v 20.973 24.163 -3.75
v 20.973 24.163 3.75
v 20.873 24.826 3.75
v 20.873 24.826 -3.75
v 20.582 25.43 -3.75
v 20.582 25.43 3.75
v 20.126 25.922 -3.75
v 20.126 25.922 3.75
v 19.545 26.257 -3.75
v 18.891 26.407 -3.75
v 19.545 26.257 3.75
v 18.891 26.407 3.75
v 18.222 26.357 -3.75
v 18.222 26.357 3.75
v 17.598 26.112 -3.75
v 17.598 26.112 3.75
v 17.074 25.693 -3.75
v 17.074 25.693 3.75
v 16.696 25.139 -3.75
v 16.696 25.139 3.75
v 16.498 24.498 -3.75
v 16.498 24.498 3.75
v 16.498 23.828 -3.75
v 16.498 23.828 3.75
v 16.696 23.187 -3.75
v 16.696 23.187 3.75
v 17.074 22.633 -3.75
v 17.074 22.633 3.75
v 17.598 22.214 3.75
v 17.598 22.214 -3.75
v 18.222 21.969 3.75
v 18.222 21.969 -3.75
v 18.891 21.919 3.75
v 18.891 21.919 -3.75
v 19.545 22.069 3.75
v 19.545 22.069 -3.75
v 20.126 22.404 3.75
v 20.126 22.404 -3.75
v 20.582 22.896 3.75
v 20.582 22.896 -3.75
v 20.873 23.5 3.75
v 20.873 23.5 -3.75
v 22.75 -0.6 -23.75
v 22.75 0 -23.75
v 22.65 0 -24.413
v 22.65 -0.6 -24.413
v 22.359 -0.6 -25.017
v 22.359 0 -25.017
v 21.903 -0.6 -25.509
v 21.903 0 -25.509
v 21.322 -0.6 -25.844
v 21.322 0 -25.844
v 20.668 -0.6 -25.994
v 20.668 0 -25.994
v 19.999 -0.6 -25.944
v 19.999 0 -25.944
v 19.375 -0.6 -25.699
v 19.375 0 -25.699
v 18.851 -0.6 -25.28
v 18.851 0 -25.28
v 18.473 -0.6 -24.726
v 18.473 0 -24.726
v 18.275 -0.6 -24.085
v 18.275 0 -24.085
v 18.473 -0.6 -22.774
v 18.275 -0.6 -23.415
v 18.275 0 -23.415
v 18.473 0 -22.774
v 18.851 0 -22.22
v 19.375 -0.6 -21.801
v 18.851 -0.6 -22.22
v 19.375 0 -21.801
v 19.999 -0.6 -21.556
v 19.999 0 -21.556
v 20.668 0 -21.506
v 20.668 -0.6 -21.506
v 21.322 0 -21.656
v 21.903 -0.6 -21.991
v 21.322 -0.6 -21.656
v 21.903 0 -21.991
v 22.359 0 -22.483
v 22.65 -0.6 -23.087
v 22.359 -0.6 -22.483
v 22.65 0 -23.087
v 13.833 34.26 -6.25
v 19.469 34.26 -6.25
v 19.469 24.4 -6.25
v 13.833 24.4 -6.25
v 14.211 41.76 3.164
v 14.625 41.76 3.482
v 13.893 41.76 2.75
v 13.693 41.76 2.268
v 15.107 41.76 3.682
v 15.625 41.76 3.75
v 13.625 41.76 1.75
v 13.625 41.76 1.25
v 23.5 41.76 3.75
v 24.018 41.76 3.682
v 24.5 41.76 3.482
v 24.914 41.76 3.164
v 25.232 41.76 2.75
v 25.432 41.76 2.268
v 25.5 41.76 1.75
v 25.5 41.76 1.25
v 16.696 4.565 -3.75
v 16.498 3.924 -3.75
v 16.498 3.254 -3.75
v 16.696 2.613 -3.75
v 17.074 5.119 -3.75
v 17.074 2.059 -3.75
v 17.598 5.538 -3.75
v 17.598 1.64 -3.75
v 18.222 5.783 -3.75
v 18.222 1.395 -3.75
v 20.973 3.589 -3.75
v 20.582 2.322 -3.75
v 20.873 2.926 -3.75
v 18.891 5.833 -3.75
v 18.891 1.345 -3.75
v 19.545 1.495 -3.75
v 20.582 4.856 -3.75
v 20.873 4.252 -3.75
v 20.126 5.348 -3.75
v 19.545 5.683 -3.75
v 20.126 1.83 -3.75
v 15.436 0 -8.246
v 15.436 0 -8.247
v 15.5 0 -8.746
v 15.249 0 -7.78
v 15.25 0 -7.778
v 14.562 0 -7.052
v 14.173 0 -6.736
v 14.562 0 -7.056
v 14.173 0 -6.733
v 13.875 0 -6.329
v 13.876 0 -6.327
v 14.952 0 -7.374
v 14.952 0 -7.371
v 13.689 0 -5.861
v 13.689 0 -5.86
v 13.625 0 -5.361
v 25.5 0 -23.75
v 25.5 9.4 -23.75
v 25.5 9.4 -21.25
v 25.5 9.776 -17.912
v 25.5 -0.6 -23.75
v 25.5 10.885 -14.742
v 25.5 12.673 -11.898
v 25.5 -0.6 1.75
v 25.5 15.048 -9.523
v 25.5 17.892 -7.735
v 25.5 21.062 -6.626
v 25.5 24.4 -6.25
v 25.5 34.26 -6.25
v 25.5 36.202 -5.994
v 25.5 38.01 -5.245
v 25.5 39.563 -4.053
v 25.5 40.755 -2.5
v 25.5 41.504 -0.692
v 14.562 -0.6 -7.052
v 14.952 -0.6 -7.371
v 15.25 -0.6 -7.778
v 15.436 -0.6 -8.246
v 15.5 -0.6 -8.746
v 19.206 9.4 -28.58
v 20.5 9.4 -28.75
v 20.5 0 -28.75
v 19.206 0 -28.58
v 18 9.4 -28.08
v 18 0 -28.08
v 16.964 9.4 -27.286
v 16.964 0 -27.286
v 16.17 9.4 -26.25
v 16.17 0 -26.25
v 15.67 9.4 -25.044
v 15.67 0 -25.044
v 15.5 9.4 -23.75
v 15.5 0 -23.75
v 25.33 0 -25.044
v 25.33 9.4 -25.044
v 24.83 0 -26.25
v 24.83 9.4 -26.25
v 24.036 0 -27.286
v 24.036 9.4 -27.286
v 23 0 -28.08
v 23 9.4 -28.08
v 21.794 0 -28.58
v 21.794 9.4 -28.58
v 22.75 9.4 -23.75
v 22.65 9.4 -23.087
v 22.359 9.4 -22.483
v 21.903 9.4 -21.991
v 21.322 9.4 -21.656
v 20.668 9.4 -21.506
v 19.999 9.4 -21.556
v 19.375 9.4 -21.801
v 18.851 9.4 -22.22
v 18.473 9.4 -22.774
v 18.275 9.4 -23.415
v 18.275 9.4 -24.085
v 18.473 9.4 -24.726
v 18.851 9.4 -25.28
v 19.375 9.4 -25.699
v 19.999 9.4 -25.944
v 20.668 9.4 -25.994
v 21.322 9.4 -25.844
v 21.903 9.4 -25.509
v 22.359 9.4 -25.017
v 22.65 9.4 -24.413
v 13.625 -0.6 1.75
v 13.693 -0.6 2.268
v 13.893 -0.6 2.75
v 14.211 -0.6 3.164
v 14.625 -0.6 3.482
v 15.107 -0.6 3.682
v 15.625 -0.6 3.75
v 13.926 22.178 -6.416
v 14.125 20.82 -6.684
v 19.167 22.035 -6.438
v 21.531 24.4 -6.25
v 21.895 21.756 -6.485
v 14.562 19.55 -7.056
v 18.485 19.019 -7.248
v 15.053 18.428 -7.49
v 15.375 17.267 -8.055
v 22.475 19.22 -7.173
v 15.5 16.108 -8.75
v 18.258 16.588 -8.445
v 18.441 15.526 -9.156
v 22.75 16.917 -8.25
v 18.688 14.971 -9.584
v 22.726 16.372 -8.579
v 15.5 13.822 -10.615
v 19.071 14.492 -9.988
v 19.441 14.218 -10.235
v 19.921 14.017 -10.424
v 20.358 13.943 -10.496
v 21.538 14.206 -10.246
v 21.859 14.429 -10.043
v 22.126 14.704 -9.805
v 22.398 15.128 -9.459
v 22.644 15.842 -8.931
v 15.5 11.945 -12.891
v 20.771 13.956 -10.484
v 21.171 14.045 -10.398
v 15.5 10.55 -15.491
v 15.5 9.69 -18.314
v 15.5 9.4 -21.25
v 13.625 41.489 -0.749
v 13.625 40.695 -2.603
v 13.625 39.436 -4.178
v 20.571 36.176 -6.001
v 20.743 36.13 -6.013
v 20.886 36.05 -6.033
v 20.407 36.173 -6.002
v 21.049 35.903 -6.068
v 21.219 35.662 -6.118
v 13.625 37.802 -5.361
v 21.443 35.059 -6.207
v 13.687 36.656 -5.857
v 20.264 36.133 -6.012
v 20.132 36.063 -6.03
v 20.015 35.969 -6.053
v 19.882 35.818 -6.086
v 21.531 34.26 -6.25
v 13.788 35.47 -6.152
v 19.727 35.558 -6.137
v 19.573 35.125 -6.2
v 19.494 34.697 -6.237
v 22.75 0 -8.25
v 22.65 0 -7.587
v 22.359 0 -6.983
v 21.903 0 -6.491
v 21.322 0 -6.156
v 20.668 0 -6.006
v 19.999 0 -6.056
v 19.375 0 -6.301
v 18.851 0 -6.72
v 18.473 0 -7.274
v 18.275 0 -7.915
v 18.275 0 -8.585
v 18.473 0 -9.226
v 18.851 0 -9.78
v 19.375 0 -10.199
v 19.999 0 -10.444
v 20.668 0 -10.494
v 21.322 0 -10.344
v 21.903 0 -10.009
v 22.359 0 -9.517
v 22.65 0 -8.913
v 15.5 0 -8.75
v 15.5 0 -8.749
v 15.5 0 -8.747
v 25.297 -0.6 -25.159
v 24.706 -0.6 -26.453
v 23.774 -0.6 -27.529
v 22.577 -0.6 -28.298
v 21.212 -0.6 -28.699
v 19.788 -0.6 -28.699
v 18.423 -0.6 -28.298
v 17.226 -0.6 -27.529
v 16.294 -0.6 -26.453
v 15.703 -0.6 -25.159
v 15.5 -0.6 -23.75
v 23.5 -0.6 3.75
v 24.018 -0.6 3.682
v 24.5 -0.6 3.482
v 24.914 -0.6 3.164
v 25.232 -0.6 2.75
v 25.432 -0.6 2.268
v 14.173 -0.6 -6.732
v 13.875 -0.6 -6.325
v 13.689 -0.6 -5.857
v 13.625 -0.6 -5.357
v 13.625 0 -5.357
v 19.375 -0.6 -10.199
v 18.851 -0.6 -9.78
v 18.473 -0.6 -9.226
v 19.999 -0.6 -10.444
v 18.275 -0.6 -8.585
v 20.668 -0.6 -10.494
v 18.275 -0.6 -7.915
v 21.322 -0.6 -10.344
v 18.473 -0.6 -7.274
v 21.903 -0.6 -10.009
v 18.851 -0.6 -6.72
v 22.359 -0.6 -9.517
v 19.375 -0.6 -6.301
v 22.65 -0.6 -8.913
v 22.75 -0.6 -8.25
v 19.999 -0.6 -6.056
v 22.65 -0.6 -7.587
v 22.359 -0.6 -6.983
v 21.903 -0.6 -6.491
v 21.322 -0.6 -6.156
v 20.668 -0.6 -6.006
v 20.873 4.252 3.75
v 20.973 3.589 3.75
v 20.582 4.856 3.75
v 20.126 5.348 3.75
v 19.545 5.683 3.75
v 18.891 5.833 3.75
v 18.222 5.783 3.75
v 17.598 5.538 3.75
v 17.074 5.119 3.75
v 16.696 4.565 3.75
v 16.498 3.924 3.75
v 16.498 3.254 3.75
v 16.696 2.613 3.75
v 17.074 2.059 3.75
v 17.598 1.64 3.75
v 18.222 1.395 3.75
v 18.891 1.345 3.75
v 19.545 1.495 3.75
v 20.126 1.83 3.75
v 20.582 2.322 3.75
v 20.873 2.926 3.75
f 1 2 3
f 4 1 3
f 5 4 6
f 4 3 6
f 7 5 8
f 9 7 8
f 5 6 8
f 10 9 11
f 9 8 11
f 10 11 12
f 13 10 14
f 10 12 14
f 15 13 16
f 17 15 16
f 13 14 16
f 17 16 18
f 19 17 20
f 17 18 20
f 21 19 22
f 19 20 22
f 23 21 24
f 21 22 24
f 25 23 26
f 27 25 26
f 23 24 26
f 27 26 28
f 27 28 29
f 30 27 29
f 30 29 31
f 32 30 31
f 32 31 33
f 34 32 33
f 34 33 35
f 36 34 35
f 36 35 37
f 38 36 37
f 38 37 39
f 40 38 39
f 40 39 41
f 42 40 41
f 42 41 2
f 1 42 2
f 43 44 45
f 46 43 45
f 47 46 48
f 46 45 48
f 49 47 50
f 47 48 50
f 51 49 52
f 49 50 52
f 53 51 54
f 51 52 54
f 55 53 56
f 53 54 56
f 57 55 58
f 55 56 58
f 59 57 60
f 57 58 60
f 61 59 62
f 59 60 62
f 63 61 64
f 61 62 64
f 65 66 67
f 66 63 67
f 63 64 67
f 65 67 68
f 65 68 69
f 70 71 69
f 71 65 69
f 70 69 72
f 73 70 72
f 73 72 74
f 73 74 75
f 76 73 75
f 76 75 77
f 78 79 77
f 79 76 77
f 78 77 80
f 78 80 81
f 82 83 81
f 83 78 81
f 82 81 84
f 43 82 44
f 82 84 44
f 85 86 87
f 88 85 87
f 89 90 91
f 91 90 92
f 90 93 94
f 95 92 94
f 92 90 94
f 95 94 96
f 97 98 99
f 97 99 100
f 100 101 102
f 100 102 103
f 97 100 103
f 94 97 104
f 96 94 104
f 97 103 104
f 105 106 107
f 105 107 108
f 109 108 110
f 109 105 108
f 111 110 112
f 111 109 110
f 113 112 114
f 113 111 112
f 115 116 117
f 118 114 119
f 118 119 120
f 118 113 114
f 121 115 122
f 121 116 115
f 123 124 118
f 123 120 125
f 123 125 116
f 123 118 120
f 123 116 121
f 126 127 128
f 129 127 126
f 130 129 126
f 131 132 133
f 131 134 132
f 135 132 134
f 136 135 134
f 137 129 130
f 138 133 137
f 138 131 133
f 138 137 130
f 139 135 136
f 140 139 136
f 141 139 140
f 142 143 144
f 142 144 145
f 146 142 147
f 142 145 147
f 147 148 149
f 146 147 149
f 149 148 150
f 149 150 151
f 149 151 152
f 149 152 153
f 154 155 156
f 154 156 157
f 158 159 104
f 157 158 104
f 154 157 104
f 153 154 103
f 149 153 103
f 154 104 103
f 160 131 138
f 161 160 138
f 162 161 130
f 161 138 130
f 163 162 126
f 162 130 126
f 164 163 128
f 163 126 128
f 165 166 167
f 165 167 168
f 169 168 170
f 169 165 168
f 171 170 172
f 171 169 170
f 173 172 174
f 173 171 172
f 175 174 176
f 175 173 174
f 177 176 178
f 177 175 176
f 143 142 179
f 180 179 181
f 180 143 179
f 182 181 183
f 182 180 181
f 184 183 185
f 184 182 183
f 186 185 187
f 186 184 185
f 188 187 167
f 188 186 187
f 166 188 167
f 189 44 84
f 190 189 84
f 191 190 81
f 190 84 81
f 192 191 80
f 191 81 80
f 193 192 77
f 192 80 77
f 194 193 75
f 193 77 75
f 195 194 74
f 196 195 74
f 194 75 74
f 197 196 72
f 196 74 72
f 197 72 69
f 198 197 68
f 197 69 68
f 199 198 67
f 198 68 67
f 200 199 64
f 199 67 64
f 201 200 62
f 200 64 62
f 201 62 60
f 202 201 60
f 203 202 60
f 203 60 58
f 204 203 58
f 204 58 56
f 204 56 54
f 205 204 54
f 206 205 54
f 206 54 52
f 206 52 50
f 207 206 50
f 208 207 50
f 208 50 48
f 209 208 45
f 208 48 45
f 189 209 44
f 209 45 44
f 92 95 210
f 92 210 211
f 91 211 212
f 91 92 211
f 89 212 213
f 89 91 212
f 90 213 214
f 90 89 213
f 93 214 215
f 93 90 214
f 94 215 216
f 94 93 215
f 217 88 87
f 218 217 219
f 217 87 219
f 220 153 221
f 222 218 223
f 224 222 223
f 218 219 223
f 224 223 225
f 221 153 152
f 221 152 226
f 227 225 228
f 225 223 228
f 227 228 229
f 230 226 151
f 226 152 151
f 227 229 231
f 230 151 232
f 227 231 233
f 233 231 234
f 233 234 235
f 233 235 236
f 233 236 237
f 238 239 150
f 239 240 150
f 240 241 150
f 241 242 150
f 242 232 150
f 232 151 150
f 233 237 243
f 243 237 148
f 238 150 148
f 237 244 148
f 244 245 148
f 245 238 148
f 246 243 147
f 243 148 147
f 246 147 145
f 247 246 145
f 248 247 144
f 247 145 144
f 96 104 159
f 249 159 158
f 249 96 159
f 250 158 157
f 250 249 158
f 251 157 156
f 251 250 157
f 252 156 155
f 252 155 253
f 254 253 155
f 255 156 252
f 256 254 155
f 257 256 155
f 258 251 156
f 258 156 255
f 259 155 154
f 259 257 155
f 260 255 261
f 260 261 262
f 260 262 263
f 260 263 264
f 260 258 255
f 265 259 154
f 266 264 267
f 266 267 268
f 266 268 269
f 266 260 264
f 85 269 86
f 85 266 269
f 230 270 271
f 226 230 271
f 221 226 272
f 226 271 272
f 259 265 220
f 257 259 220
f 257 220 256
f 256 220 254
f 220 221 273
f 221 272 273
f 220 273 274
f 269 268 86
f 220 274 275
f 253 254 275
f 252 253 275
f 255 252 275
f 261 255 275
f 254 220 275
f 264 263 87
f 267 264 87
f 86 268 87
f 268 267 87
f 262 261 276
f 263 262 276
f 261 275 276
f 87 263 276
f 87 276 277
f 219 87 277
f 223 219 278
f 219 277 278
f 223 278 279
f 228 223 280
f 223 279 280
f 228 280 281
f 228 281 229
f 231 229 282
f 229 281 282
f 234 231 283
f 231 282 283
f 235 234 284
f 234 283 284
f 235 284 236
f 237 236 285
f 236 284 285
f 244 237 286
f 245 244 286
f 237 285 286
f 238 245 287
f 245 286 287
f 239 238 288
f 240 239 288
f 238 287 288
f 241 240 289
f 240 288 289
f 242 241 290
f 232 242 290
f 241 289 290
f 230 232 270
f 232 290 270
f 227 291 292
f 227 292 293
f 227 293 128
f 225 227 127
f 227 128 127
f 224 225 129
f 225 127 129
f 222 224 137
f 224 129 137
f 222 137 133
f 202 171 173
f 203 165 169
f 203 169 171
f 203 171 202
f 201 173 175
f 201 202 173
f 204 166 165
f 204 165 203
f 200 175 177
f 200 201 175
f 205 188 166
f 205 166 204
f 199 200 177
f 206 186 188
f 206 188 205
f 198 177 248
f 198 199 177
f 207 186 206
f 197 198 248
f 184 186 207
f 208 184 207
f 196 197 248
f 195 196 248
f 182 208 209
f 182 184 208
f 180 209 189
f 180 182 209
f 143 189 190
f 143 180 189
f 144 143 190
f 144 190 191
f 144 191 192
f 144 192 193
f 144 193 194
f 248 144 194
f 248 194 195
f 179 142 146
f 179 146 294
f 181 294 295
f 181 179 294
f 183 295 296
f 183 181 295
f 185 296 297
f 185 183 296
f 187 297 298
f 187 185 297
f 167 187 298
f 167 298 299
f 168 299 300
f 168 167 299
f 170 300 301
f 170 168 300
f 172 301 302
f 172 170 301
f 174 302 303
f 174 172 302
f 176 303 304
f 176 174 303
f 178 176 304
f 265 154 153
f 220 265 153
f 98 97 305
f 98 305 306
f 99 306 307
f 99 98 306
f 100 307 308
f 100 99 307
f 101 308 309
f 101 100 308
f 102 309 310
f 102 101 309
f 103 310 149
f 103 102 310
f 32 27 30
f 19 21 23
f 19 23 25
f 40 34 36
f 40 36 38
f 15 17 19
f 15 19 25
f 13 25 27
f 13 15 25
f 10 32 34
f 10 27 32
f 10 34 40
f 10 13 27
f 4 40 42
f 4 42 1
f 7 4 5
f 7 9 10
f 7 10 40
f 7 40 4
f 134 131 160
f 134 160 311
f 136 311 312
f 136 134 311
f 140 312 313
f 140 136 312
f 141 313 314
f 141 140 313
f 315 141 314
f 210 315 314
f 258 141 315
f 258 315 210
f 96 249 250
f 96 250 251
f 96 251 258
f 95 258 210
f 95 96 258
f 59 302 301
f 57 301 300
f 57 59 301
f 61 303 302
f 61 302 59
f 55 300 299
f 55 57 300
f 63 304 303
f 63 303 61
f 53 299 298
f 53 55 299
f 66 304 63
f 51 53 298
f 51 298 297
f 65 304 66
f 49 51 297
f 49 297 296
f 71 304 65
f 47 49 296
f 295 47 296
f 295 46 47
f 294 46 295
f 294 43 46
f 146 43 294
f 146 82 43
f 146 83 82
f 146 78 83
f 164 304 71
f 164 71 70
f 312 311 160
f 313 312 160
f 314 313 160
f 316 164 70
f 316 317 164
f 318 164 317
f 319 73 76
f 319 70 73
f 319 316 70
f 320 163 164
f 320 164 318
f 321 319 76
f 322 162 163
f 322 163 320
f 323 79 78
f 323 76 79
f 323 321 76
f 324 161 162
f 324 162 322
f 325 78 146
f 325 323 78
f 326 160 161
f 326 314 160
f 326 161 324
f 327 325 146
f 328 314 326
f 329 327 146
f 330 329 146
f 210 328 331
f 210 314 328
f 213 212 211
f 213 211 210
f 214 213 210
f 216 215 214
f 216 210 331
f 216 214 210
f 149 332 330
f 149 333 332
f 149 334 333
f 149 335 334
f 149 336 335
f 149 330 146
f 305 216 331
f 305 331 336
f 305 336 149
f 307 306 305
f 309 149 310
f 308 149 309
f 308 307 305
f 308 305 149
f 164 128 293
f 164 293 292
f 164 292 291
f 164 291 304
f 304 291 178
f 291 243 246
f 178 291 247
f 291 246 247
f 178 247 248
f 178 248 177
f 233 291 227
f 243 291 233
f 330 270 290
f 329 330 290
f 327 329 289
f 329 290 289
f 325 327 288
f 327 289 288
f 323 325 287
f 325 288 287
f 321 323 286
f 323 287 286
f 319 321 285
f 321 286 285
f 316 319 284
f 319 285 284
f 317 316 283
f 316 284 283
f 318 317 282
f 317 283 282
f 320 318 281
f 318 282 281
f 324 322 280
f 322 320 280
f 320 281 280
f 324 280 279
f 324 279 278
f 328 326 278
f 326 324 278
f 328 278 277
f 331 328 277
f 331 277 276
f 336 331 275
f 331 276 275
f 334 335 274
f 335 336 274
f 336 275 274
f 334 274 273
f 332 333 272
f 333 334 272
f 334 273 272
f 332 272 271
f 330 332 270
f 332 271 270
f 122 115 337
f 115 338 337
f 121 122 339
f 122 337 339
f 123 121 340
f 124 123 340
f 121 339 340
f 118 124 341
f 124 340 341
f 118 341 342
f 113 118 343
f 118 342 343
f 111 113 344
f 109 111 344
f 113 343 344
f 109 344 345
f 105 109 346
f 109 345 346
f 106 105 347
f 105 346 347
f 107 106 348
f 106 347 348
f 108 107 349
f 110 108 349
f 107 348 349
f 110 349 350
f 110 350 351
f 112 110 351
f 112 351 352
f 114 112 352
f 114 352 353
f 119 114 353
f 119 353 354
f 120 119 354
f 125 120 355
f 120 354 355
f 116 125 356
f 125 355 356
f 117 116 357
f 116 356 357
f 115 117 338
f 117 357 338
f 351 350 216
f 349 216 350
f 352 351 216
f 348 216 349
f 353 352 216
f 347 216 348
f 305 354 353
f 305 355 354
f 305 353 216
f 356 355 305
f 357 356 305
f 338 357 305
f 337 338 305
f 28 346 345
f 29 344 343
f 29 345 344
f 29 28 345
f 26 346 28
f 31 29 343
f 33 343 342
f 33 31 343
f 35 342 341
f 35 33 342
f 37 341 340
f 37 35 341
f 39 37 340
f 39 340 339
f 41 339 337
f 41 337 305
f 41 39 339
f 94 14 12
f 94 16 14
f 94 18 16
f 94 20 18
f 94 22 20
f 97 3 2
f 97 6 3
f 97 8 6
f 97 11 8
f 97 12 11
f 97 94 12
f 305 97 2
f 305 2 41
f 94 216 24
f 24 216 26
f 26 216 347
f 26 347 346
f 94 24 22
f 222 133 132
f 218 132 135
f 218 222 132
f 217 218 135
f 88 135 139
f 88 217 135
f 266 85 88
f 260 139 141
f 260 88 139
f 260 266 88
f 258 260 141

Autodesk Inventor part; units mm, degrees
ref_plane "YZ Plane" through (0, 0, 0) normal (1, 0, 0) x (0, 1, 0)
ref_plane "XZ Plane" through (0, 0, 0) normal (0, 1, 0) x (-1, 0, 0)
ref_plane "XY Plane" through (0, 0, 0) normal (0, 0, 1) x (1, 0, 0)
sketch "スケッチ1" plane through (0, 0, 0) normal (0, 0, 1) x (1, 0, 0)
  line L0 (0, 0) -> (25.5, 0)
  line L1 (25.5, 0) -> (25.5, 41.76)
  line L2 (25.5, 41.76) -> (0, 41.76)
  line L3 (0, 41.76) -> (0, 0)
  line L4 (0, 3) -> (25.5, 3) construction
  line L5 (13.5, 41.76) -> (13.5, 0) construction
  line L6 (12, 41.76) -> (12, 0) construction
  line L7 (12, 7.267) -> (13.5, 7.267)
  line L8 (13.5, 7.267) -> (13.5, 17.554)
  line L9 (13.5, 17.554) -> (12, 17.554)
  line L10 (12, 17.554) -> (12, 7.267)
  line L11 (12, 27.612) -> (13.5, 27.612)
  line L12 (13.5, 27.612) -> (13.5, 37.899)
  line L13 (13.5, 37.899) -> (12, 37.899)
  line L14 (12, 37.899) -> (12, 27.612)
  dimension "d0" = 3
  dimension "d1" = 38.76
  dimension "d2" = 1.5
  dimension "d3" = 12
  dimension "d4" = 25.5
  dimension "d5" = 4.267
  dimension "d6" = 10.287
  dimension "d7" = 10.058
  dimension "d8" = 10.287
  dimension "d11" = 12
extrude "押し出し1" add sketch "スケッチ1" along normal mid plane 7.5
sketch "スケッチ2" plane through (0, 0, -3.75) normal (0, -1, 0) x (1, 0, 0)
  line L0 (25.5, 7.5) -> (0, 7.5) projected
  line L1 (0, 7.5) -> (25.5, 7.5)
  line L2 (25.5, 7.5) -> (25.5, 2.5)
  line L3 (25.5, -2.5) -> (20.5, -2.5)
  line L4 (0, -2.5) -> (0, 2.5)
  line L5 (25.5, 2.5) -> (0, 2.5) construction
  line L6 (0, 3.75) -> (0, 7.5) construction
  arc A0 (0, 2.5) -> (5, -2.5) centre (5, 2.5) ccw
  line L7 (5, 2.5) -> (5, -2.5) construction
  line L8 (5, 2.5) -> (0, 2.5) construction
  arc A1 (20.5, -2.5) -> (25.5, 2.5) centre (20.5, 2.5) ccw
  line L9 (20.5, 2.5) -> (20.5, -2.5) construction
  line L10 (20.5, 2.5) -> (25.5, 2.5) construction
  line L11 (25.5, 0) -> (25.5, 7.5) projected
  line L12 (0, 2.5) -> (0, 7.5)
  line L13 (5, -2.5) -> (0, -2.5)
  line L14 (20.5, -2.5) -> (5, -2.5)
  line L15 (25.5, 2.5) -> (25.5, -2.5)
  dimension "d12" = 90
  dimension "d13" = 90
  dimension "d14" = 10
  dimension "d15" = 5
extrude "押し出し2" add sketch "スケッチ2" against normal up to surface (7.267 mm away)
extrude "押し出し3" [suppressed]
ref_plane "作業平面1" through (0, 0, -1.25) normal (0, 0, 1) x (1, 0, 0)
sketch "スケッチ3" plane through (0, 0, 3.75) normal (0, -1, 0) x (1, 0, 0)
  arc A0 (0, -5) -> (5, -10) centre (5, -5) ccw construction
  arc A1 (20.5, -10) -> (25.5, -5) centre (20.5, -5) ccw construction
  circle A2 centre (5, -5) radius 2.25
  circle A3 centre (20.5, -5) radius 2.25
  point P0 (0, -3.75)
  dimension "d20" = 4.5
  dimension "d21" = 4.5
extrude "押し出し4" cut sketch "スケッチ3" against normal up to surface (41.76 mm away)
sketch "スケッチ4" plane through (0.6699, 41.76, -3.75) normal (0, 1, 0) x (1, 0, 0)
  circle A0 centre (19.8301, -2.5) radius 2.25 construction
  circle A1 centre (4.3301, -2.5) radius 2.25 construction
  line L0 (0, 0) -> (24.1603, 0) projected
  line L1 (19.8301, 0) -> (19.8301, -2.5) construction
  line L2 (17.5801, 0) -> (17.5801, -2.5)
  line L3 (22.0801, -2.5) -> (22.0801, 0)
  arc A2 (22.0801, 0) -> (17.5801, 0) centre (19.8301, 0) ccw
  arc A3 (17.5801, -2.5) -> (22.0801, -2.5) centre (19.8301, -2.5) ccw
  line L4 (4.3301, -0.25) -> (4.3301, -2.5) construction
  line L5 (2.0801, -0.25) -> (2.0801, -2.5)
  line L6 (6.5801, -2.5) -> (6.5801, -0.25)
  arc A4 (6.5801, -0.25) -> (2.0801, -0.25) centre (4.3301, -0.25) ccw
  arc A5 (2.0801, -2.5) -> (6.5801, -2.5) centre (4.3301, -2.5) ccw
  point P0 (-0.6699, -3.75)
  point P1 (19.8301, -1.25)
  point P2 (4.3301, -1.375)
extrude "押し出し5" [suppressed]
sketch "スケッチ5" plane through (12, 7.267, 3.75) normal (1, 0, 0) x (0, 0, -1)
  line L0 (0, 0) -> (7.5, 0) construction
  line L1 (7.5, 10.287) -> (0, 10.287) construction
  line L2 (7.5, 10.287) -> (10, 12.787)
  line L3 (10, 12.787) -> (10, -2.5)
  line L4 (10, -2.5) -> (7.5, 0)
  line L5 (7.5, 0) -> (7.5, 10.287)
  line L6 (10, -7.267) -> (10, 0) projected
  point P0 (3.75, -7.267)
  dimension "d28" = 135
  dimension "d29" = 135
sketch "スケッチ6" plane through (0, 0, 3.75) normal (0, 0, 1) x (1, 0, 0)
  line L0 (12, 27.612) -> (12, 37.899) construction
  line L1 (12, 37.899) -> (13.5, 37.899) construction
  line L2 (13.5, 37.899) -> (13.5, 27.612) construction
  line L3 (13.5, 27.612) -> (12, 27.612) construction
  line L4 (12, 7.267) -> (12, 17.554) construction
  line L5 (12, 17.554) -> (13.5, 17.554) construction
  line L6 (13.5, 17.554) -> (13.5, 7.267) construction
  line L7 (13.5, 7.267) -> (12, 7.267) construction
  line L8 (0, 0) -> (25.5, 0) construction
  line L9 (25.5, 41.76) -> (0, 41.76) construction
  line L10 (13.625, 27.487) -> (13.625, 38.024)
  line L11 (13.625, 38.024) -> (11.875, 38.024)
  line L12 (11.875, 38.024) -> (11.875, 27.487)
  line L13 (11.875, 27.487) -> (13.625, 27.487)
  line L14 (13.625, 7.142) -> (13.625, 17.679)
  line L15 (13.625, 17.679) -> (11.875, 17.679)
  line L16 (11.875, 17.679) -> (11.875, 7.142)
  line L17 (11.875, 7.142) -> (13.625, 7.142)
  line L18 (0, 41.76) -> (0, 0) projected
  line L19 (25.5, 0) -> (25.5, 41.76) projected
  dimension "d32" = 0.125
  dimension "d33" = 0.125
extrude "押し出し7" cut sketch "スケッチ6" against normal through all
sketch "スケッチ8" plane through (0, 0, 3.75) normal (0, -1, 0) x (1, 0, 0)
  line L0 (13.625, 0) -> (13.625, -10) construction
  line L1 (0, 0) -> (0, -10) projected
  line L2 (0, 0) -> (13.625, 0)
  line L3 (13.625, 0) -> (13.625, -10)
  line L4 (13.625, -10) -> (0, -10)
  line L5 (0, -10) -> (0, 0)
  point P0 (0, -3.75)
extrude "押し出し10" cut sketch "スケッチ8" against normal up to surface (41.76 mm away)
sketch "スケッチ9" plane through (25.5, 7.267, -3.75) normal (0, 1, 0) x (1, 0, 0)
  line L0 (-11.875, 2.5) -> (-11.875, 0) projected
  line L1 (0, 0) -> (-11.875, 0) projected
  line L2 (0, 0) -> (0, 2.5) projected
  line L3 (0, 2.5) -> (-11.875, 2.5) projected
  point P0 (-25.5, -3.75)
extrude "押し出し11" add sketch "スケッチ9" along normal up to surface (34.493 mm away)
sketch "スケッチ10" plane through (25.5, 0, -6.25) normal (0, -1, 0) x (1, 0, 0)
  line L0 (-11.875, 0) -> (0, 0) projected
  line L1 (-11.875, 0) -> (0, 0)
  line L2 (0, 0) -> (0, -22.5)
  line L3 (0, -22.5) -> (-11.875, -22.5)
  line L4 (-11.875, -22.5) -> (-11.875, 0)
  circle A0 centre (-5, 5) radius 2.25 construction
  line L5 (-5, 5) -> (-5, -17.5) construction
  circle A1 centre (-5, -17.5) radius 2.25
  point P0 (-25.5, 6.25)
  dimension "d46" = 22.5
  dimension "d47" = 5
  dimension "d48" = 5
extrude "押し出し12" add sketch "スケッチ10" against normal up to surface (41.76 mm away)
sketch "スケッチ12" plane through (13.625, 0, 3.75) normal (0, -1, 0) x (1, 0, 0)
  circle A0 centre (6.875, -5) radius 2.25 projected
  point P0 (-13.625, -3.75)
extrude "押し出し14" add sketch "スケッチ12" against normal up to surface (41.76 mm away)
sketch "スケッチ11" plane through (0, 0, 3.75) normal (0, 0, 1) x (1, 0, 0)
  line L0 (22.75, 0) -> (18.25, 0) construction
  line L1 (18.723, 0) -> (18.723, 3.589) construction
  circle A0 centre (18.723, 3.589) radius 2.25
  line L2 (13.625, 41.76) -> (13.625, 0) projected
  line L3 (18.723, 3.589) -> (18.723, 24.163) construction
  line L4 (18.25, 0) -> (18.25, 41.76) construction
  circle A1 centre (18.723, 24.163) radius 2.25
  point P0 (0, 0)
  dimension "d51" = 4.5
  dimension "d52" = 3.589
  dimension "d53" = 5.098
  dimension "d54" = 20.574
extrude "押し出し13" cut sketch "スケッチ11" against normal blind 7.5
sketch "スケッチ13" plane through (13.625, 0, 3.75) normal (0, -1, 0) x (1, 0, 0)
  circle A0 centre (6.875, -27.5) radius 2.25 construction
  line L0 (6.875, -27.5) -> (6.875, -12) construction
  circle A1 centre (6.875, -12) radius 2.25
  point P0 (-13.625, -3.75)
  dimension "d59" = 15.5
extrude "押し出し15" cut sketch "スケッチ13" against normal up to surface (41.76 mm away)
sketch "スケッチ14" plane through (13.625, 0, 3.75) normal (0, -1, 0) x (1, 0, 0)
  line L0 (2.848, -7.5) -> (7.348, -7.5) construction
  line L1 (2.848, 0) -> (7.348, 0) construction
  line L2 (0, -32.5) -> (0, 0) projected
  line L3 (0, -32.5) -> (1.875, -32.5)
  line L4 (1.875, -32.5) -> (1.875, -10.5)
  line L5 (1.875, -10.5) -> (0, -10.5)
  line L6 (0, -10.5) -> (0, -32.5)
  circle A0 centre (6.875, -27.5) radius 2.25 projected
  point P0 (-13.625, -3.75)
  dimension "d62" = 3
  dimension "d63" = 5
extrude "押し出し16" cut sketch "スケッチ14" against normal up to surface (41.76 mm away) contours L2 L5 L4 L3
fillet "フィレット4" radius 2 1 edges at (15.5, 20.88, -6.75)
fillet "フィレット5" radius 5 2 edges at (25.5, 20.88, -28.75) (15.5, 20.88, -28.75)
sketch "スケッチ16" plane through (13.625, 41.76, 3.75) normal (0, 1, 0) x (1, 0, 0)
  arc A0 (11.875, 27.5) -> (1.875, 27.5) centre (6.875, 27.5) ccw projected
  line L0 (1.875, 27.5) -> (1.875, 12.4961) projected
  arc A1 (0, 10.5) -> (1.875, 12.4961) centre (-0.125, 12.4961) ccw projected
  line L1 (0, 10.5) -> (0, 0) projected
  line L2 (11.875, 0) -> (0, 0) projected
  line L3 (11.875, 27.5) -> (11.875, 0) projected
  circle A2 centre (6.875, 27.5) radius 2.25 projected
  circle A3 centre (6.875, 12) radius 2.25 projected
  point P0 (-13.625, 3.75)
extrude "押し出し17" add sketch "スケッチ16" along normal blind 7.928
sketch "スケッチ17" plane through (0, 0, 3.75) normal (0, 0, 1) x (1, 0, 0)
  circle A0 centre (18.723, 3.589) radius 2.25 construction
  circle A1 centre (18.723, 24.163) radius 2.25 construction
  line L0 (18.723, 3.589) -> (18.723, 24.163) construction
  line L1 (18.25, 0) -> (18.25, 49.688) construction
  line L2 (18.723, 24.163) -> (18.723, 44.737) construction
  line L3 (18.723, 44.737) -> (18.723, 65.311) construction
  circle A2 centre (18.723, 44.737) radius 2.25
  circle A3 centre (18.723, 65.311) radius 2.25
  point P0 (0, 0)
extrude "押し出し18" cut sketch "スケッチ17" against normal blind 7.5
fillet "フィレット6" radius 2 1 edges at (13.625, 20.88, -6.7539)
fillet "フィレット7" radius 2 2 edges at (13.625, 24.844, 3.75) (25.5, 24.844, 3.75)
sketch "スケッチ18" plane through (25.5, 0, -23.75) normal (1, 0, 0) x (0, 0, -1)
  line L0 (-27.5, 49.688) -> (-27.5, 0) projected
  line L1 (-27.5, 41.76) -> (-7.75, 41.76)
  line L2 (0, 0) -> (-25.5, 0) projected
  arc A0 (5, 29.01) -> (-7.75, 41.76) centre (-7.75, 29.01) ccw
  line L3 (-7.75, 29.01) -> (5, 29.01) construction
  line L4 (-7.75, 29.01) -> (-7.75, 41.76) construction
  line L5 (-27.5, 41.76) -> (-27.5, 50.688)
  line L6 (-27.5, 50.688) -> (6, 50.688)
  line L7 (6, 50.688) -> (6, 29.01)
  line L8 (6, 29.01) -> (5, 29.01)
  line L9 (-25.5, 49.688) -> (0, 49.688) projected
  line L10 (5, 0) -> (5, 49.688) construction
  point P0 (-23.75, 0)
  dimension "d75" = 41.76
  dimension "d76" = 90
  dimension "d77" = 12.75
  dimension "d78" = 1
  dimension "d79" = 6
extrude "押し出し19" cut sketch "スケッチ18" against normal up to surface (11.875 mm away)
sketch "スケッチ19" plane through (20.5, 0, -23.75) normal (0, -1, 0) x (1, 0, 0)
  arc A0 (5, 25.5) -> (3, 27.5) centre (3, 25.5) ccw projected
  line L0 (-4.875, 27.5) -> (3, 27.5) projected
  arc A1 (-4.875, 27.5) -> (-6.875, 25.5) centre (-4.875, 25.5) ccw projected
  line L1 (-6.875, 18.3928) -> (-6.875, 25.5) projected
  arc A2 (-6.875, 18.3928) -> (-5.9375, 16.6983) centre (-4.875, 18.3928) ccw projected
  arc A3 (-5, 15.0039) -> (-5.9375, 16.6983) centre (-7, 15.0039) ccw projected
  line L2 (-5, 15.0039) -> (-5, 0) projected
  arc A4 (-5, 0) -> (5, 0) centre (0, 0) ccw projected
  line L3 (5, 0) -> (5, 25.5) projected
  circle A5 centre (0, 0) radius 2.25 projected
  circle A6 centre (0, 15.5) radius 2.25 projected
  point P0 (-20.5, 23.75)
extrude "押し出し20" add sketch "スケッチ19" along normal blind 0.6
sketch "スケッチ20" plane through (25.5, 41.76, 1.75) normal (1, 0, 0) x (0, 0, -1)
  line L0 (8, 0) -> (30.5, 0)
  line L1 (30.5, 0) -> (30.5, -32.36)
  line L2 (30.5, -32.36) -> (23, -32.36)
  line L3 (8, 0) -> (8, -17.36)
  line L4 (7.1072, 0) -> (7.1072, -42.36) projected
  arc A0 (8, -17.36) -> (23, -32.36) centre (23, -17.36) ccw
  line L5 (-2, 0) -> (-2, -42.36) projected
  line L6 (25.5, -42.36) -> (30.5, -42.36) projected
  line L7 (30.5, -42.36) -> (30.5, -12.75) construction
  line L8 (17.75, 0) -> (0, 0) construction
  point P0 (1.75, -41.76)
  dimension "d84" = 10
  dimension "d85" = 10
  dimension "d86" = 15
extrude "押し出し21" cut sketch "スケッチ20" against normal up to surface (11.875 mm away)
fillet "フィレット8" radius 7.5 1 edges at (16.6513, 41.76, -6.25)
equation "\"d8\" = d6"
equation "\"d11\" = d3"
equation "\"d29\" = d28"
equation "\"d33\" = d32"
equation "\"d48\" = d47"
properties part number "small_gpu_02" material "アルミニウム 6061"
